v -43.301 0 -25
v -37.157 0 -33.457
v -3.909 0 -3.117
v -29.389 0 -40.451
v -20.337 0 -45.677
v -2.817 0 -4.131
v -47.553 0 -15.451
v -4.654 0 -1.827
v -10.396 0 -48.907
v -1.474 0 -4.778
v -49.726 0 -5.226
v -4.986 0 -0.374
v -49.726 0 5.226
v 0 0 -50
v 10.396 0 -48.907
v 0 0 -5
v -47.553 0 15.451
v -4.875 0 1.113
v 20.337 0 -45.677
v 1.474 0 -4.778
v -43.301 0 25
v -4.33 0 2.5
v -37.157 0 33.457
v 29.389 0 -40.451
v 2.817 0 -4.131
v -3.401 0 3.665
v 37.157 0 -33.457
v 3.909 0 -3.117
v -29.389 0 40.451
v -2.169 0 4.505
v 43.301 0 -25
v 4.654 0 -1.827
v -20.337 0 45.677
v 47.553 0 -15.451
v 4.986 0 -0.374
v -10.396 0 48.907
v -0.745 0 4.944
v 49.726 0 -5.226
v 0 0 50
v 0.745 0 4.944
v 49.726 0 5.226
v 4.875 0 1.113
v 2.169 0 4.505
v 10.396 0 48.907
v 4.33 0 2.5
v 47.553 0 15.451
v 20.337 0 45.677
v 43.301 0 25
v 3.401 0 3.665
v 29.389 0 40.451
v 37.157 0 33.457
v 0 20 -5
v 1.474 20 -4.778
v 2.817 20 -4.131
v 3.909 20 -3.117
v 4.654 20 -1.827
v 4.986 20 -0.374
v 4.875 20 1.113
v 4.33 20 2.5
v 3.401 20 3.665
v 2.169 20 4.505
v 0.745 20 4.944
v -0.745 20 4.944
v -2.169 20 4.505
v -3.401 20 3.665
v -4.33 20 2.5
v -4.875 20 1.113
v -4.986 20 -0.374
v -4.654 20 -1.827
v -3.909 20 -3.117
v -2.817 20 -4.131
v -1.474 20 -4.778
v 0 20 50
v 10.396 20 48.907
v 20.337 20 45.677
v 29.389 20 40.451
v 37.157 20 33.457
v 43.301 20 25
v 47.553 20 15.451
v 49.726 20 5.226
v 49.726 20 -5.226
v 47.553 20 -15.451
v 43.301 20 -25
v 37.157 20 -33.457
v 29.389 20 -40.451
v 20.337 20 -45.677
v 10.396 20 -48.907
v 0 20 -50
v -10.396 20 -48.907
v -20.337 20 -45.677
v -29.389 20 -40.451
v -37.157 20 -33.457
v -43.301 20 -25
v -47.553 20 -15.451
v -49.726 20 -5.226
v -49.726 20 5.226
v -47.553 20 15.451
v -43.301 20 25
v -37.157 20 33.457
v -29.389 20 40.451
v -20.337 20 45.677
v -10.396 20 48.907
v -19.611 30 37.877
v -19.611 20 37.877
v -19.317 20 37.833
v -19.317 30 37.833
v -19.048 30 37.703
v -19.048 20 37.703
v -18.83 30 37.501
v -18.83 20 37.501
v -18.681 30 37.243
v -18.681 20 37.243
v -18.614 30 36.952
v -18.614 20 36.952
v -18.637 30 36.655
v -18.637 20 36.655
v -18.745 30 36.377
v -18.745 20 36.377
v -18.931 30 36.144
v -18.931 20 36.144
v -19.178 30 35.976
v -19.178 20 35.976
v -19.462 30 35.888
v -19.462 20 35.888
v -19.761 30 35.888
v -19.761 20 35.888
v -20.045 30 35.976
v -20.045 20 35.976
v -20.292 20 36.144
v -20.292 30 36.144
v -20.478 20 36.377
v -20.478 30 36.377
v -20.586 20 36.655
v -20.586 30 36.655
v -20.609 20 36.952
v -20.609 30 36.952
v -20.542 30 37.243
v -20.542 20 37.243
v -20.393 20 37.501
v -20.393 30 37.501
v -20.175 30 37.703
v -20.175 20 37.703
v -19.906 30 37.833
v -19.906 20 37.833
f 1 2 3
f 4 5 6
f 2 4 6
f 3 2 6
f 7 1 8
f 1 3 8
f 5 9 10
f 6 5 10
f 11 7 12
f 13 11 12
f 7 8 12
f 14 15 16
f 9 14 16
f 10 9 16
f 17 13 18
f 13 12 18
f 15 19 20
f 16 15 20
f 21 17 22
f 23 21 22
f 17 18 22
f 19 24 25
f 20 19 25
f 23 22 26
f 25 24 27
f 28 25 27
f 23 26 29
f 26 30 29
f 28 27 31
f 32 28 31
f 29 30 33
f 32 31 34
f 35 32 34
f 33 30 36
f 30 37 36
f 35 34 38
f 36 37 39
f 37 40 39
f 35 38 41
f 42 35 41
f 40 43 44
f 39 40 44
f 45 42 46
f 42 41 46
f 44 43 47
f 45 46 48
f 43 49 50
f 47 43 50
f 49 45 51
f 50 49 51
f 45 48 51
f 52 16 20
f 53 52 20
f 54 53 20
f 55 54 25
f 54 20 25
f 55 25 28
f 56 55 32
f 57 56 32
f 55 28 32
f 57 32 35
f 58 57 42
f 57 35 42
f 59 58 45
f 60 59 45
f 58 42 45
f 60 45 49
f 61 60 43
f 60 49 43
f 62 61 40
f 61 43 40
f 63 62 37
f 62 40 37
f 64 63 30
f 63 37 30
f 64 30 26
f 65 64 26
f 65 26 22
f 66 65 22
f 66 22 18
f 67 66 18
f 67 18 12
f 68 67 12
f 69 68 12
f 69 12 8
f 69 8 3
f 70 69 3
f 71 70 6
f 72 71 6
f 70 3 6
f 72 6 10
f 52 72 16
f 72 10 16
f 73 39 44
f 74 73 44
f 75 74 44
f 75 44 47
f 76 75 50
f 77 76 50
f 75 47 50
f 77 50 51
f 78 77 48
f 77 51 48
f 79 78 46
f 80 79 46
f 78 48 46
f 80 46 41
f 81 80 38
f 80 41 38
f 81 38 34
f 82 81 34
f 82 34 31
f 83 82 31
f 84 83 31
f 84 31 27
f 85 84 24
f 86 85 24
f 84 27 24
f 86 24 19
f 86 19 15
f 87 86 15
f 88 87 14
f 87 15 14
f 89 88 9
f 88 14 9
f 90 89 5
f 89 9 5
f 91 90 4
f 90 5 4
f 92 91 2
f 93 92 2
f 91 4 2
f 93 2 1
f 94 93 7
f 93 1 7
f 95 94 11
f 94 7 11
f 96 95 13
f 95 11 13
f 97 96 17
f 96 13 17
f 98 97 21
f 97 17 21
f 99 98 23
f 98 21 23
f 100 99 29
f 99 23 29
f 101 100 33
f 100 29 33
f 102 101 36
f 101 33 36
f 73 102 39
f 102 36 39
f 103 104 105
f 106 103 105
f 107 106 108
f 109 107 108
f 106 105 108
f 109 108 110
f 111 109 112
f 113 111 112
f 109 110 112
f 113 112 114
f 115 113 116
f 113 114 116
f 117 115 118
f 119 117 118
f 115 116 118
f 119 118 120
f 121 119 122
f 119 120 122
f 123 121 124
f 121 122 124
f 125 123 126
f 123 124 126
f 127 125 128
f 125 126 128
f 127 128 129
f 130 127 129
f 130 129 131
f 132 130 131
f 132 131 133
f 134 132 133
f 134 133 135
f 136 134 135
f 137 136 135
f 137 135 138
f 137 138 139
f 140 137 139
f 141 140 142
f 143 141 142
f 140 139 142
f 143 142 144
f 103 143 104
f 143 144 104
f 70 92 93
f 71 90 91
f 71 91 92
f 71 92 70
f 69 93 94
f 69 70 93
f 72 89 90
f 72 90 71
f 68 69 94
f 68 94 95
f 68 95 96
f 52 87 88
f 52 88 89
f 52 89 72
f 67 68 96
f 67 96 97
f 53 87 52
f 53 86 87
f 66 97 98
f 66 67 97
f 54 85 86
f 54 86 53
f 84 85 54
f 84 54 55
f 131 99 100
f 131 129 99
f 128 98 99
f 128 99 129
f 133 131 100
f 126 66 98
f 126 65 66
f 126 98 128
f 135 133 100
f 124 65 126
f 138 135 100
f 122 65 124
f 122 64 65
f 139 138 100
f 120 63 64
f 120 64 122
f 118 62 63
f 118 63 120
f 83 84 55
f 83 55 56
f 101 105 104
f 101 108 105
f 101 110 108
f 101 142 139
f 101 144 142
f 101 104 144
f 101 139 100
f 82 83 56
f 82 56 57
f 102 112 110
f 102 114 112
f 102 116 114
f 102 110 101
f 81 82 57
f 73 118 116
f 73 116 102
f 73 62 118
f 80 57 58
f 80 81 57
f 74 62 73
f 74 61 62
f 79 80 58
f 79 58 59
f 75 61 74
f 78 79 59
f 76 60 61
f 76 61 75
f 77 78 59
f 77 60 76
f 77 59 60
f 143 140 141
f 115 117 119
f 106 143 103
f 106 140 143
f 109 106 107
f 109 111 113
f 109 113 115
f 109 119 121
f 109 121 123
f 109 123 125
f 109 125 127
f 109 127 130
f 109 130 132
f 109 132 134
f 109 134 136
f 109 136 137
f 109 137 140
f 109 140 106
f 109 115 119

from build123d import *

# Parameters (mm, degrees)
SKETCH1_R           = 50
BOSS_EXTRUDE1_DEPTH = 20
SKETCH4_R           = 5
CUT_EXTRUDE2_DEPTH  = 20
SKETCH5_R           = 1
BOSS_EXTRUDE2_DEPTH = 10


with BuildPart() as part:
    # Sketch1 → Boss-Extrude1 (new body)
    with BuildSketch(Plane(origin=(0, 0, 0), x_dir=(1, 0, 0), z_dir=(0, 1, 0))):
        with Locations(Location((0, 0, 0), (0, 0, 270))):
            Circle(SKETCH1_R)
    extrude(amount=BOSS_EXTRUDE1_DEPTH)

    # Sketch4 → Cut-Extrude2 (cut)
    with BuildSketch(Plane.XZ):
        with Locations(Location((0, 0, 0), (0, 0, 270))):
            Circle(SKETCH4_R)
    extrude(amount=-CUT_EXTRUDE2_DEPTH, mode=Mode.SUBTRACT)

    # Sketch5 → Boss-Extrude2 (add)
    with BuildSketch(Plane(origin=(0, 20, 0), x_dir=(1, 0, 0), z_dir=(0, 1, 0))):
        with Locations(Location((-19.611481927, -36.877253926, 0), (0, 0, 270))):
            Circle(SKETCH5_R)
    extrude(amount=BOSS_EXTRUDE2_DEPTH)


solid = part.part
